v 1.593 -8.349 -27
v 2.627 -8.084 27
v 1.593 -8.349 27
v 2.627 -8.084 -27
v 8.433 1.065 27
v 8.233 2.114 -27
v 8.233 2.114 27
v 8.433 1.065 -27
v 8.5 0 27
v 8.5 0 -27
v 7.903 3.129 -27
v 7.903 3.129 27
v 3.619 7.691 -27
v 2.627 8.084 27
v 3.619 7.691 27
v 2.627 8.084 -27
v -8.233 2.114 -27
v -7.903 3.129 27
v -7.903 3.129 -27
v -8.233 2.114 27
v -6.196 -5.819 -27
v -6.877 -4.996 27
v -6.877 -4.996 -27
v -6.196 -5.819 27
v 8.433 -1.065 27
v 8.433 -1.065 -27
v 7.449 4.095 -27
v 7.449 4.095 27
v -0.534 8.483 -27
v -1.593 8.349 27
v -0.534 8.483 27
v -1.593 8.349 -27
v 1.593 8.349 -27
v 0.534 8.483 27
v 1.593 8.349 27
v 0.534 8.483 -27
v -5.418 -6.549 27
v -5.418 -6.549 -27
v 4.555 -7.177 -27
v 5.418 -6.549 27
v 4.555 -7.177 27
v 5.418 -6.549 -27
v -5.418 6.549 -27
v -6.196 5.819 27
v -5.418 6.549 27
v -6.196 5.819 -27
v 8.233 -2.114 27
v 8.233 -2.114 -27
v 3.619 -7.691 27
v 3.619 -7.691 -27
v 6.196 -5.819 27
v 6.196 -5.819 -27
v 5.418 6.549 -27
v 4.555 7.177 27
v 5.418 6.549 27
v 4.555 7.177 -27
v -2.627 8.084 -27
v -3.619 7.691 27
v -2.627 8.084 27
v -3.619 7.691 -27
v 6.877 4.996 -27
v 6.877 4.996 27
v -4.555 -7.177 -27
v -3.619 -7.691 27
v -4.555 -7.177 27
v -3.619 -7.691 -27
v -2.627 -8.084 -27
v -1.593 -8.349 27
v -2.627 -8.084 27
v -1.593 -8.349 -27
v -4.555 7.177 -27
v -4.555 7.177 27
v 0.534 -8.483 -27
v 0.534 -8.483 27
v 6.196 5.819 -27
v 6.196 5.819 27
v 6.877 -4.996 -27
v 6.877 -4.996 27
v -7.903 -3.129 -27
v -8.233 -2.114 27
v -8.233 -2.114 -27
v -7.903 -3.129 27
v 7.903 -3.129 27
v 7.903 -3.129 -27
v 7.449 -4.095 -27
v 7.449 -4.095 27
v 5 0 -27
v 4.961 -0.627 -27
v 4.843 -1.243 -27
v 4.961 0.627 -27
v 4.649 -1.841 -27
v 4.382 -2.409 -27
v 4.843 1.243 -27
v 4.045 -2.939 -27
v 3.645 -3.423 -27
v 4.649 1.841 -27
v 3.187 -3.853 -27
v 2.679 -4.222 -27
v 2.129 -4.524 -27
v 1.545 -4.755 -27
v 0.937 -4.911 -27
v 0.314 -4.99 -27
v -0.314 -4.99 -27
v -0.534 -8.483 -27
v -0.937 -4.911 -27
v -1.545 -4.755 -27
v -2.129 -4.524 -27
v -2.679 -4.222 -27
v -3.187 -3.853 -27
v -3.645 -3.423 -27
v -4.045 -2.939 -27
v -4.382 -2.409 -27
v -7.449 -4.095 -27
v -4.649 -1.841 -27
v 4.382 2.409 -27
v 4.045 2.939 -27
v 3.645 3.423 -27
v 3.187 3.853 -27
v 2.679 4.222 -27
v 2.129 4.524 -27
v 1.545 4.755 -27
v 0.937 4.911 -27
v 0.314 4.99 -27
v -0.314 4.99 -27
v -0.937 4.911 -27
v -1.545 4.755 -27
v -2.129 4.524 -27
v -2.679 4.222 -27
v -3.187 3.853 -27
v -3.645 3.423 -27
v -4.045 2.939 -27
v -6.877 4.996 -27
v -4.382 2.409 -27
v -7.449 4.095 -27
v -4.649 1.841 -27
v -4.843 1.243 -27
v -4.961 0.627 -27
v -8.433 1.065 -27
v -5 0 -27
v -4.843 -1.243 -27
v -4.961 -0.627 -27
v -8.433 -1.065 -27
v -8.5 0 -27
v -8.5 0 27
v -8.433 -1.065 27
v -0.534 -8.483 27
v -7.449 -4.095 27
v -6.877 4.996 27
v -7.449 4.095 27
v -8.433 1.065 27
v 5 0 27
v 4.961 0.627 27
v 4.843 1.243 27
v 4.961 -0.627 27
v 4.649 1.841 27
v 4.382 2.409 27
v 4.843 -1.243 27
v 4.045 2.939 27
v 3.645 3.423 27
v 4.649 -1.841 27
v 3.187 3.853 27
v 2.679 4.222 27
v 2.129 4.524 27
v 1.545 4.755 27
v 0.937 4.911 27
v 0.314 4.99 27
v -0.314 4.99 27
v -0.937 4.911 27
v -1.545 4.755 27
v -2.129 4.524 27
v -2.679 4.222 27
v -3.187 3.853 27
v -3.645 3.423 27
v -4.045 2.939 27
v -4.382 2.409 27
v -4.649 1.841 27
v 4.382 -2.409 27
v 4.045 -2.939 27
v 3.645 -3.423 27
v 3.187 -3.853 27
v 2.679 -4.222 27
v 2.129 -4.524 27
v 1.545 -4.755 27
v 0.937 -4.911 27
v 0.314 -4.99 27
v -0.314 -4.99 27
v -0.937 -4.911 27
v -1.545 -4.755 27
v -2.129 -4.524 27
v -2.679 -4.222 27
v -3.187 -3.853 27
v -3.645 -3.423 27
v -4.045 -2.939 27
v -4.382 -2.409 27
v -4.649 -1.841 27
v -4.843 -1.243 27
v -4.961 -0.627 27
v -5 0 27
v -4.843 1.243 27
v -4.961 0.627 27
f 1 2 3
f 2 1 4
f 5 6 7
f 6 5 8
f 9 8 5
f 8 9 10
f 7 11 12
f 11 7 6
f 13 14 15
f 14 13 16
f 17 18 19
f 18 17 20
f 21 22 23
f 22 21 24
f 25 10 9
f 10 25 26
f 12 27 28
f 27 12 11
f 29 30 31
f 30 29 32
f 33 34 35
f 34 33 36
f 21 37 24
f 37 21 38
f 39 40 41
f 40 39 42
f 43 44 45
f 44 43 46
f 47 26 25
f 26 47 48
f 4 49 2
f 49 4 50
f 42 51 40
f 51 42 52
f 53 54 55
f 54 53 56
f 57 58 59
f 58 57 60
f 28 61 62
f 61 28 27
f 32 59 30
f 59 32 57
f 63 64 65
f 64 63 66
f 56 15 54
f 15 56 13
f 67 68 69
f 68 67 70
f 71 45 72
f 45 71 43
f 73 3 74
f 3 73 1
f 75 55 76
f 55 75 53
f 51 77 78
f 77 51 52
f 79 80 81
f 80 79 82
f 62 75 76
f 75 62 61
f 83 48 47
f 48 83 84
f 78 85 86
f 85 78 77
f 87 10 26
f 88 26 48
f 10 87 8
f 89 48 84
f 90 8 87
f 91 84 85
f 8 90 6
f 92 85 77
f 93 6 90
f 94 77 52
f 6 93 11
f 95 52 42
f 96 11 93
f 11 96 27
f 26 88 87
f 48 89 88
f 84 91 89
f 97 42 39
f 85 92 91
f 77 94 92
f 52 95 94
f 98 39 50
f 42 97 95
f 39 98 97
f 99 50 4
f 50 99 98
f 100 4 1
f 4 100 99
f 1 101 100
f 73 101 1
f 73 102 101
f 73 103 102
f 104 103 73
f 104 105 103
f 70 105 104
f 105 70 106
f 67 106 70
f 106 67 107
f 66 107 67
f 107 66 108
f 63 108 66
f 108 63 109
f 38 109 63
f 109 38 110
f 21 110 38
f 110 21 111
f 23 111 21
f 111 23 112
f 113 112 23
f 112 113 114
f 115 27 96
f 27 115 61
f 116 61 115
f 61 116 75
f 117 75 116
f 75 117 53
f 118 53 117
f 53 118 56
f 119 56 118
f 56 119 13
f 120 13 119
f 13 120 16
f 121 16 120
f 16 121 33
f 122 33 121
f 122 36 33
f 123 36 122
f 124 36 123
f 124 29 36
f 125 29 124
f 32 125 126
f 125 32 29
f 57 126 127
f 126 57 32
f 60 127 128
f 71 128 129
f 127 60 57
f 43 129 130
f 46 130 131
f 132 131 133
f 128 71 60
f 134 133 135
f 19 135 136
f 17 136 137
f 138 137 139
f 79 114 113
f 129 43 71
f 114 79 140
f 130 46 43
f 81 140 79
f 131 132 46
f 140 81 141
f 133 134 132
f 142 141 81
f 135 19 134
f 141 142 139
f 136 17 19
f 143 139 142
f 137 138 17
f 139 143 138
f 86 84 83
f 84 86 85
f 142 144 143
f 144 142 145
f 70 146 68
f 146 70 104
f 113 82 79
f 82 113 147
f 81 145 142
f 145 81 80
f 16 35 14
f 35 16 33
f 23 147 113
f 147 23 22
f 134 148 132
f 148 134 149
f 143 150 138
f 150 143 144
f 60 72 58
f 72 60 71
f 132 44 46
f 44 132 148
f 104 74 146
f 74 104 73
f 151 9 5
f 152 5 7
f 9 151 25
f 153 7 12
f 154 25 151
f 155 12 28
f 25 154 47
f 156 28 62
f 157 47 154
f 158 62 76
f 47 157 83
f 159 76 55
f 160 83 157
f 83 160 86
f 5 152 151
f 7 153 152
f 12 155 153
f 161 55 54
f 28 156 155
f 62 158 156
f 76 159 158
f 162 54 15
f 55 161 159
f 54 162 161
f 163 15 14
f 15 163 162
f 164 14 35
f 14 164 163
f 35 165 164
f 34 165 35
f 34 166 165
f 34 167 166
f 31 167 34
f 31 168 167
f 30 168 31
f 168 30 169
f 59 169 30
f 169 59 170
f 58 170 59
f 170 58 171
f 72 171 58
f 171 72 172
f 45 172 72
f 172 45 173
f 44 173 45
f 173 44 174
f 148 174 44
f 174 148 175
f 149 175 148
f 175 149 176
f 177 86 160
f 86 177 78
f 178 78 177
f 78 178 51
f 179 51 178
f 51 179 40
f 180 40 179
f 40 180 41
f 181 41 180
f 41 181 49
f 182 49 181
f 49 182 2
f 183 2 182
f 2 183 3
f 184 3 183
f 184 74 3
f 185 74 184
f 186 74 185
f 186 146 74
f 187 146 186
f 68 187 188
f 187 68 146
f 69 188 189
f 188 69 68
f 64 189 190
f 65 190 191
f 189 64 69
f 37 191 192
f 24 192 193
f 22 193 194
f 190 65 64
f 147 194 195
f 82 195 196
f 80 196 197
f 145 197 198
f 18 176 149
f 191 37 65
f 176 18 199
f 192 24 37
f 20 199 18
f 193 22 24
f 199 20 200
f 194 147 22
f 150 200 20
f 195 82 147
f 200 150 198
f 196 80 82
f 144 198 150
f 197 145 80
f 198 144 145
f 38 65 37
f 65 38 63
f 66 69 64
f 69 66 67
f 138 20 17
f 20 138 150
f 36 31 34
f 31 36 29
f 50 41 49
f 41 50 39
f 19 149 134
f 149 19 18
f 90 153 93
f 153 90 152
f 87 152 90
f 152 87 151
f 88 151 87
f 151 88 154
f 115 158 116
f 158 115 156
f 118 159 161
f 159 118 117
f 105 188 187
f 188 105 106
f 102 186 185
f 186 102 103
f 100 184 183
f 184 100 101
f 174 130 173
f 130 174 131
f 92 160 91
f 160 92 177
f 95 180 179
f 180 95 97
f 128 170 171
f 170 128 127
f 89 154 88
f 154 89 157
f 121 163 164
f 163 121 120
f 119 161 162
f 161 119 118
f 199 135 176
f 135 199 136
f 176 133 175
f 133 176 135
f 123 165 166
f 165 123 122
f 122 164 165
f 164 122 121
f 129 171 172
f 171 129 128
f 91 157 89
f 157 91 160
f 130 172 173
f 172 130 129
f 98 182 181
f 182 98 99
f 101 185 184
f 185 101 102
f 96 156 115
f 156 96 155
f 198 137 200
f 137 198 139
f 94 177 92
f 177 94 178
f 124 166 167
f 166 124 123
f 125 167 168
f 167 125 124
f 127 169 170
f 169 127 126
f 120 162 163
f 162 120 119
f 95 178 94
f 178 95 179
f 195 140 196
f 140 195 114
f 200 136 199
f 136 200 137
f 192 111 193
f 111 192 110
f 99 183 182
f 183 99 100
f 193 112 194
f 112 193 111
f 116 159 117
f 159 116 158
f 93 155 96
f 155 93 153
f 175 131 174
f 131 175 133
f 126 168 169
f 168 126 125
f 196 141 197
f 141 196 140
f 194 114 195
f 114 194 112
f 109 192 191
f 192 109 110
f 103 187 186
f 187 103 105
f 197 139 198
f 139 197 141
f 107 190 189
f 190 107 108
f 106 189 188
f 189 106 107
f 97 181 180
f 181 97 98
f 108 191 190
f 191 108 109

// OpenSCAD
$fn = 50;


difference() {
	union() {
		translate(v = [0, 0, -27.0000000000]) {
			cylinder(h = 54, r = 8.5000000000);
		}
	}
	union() {
		translate(v = [0, 0, -100.0000000000]) {
			cylinder(h = 200, r = 5.0000000000);
		}
	}
}
